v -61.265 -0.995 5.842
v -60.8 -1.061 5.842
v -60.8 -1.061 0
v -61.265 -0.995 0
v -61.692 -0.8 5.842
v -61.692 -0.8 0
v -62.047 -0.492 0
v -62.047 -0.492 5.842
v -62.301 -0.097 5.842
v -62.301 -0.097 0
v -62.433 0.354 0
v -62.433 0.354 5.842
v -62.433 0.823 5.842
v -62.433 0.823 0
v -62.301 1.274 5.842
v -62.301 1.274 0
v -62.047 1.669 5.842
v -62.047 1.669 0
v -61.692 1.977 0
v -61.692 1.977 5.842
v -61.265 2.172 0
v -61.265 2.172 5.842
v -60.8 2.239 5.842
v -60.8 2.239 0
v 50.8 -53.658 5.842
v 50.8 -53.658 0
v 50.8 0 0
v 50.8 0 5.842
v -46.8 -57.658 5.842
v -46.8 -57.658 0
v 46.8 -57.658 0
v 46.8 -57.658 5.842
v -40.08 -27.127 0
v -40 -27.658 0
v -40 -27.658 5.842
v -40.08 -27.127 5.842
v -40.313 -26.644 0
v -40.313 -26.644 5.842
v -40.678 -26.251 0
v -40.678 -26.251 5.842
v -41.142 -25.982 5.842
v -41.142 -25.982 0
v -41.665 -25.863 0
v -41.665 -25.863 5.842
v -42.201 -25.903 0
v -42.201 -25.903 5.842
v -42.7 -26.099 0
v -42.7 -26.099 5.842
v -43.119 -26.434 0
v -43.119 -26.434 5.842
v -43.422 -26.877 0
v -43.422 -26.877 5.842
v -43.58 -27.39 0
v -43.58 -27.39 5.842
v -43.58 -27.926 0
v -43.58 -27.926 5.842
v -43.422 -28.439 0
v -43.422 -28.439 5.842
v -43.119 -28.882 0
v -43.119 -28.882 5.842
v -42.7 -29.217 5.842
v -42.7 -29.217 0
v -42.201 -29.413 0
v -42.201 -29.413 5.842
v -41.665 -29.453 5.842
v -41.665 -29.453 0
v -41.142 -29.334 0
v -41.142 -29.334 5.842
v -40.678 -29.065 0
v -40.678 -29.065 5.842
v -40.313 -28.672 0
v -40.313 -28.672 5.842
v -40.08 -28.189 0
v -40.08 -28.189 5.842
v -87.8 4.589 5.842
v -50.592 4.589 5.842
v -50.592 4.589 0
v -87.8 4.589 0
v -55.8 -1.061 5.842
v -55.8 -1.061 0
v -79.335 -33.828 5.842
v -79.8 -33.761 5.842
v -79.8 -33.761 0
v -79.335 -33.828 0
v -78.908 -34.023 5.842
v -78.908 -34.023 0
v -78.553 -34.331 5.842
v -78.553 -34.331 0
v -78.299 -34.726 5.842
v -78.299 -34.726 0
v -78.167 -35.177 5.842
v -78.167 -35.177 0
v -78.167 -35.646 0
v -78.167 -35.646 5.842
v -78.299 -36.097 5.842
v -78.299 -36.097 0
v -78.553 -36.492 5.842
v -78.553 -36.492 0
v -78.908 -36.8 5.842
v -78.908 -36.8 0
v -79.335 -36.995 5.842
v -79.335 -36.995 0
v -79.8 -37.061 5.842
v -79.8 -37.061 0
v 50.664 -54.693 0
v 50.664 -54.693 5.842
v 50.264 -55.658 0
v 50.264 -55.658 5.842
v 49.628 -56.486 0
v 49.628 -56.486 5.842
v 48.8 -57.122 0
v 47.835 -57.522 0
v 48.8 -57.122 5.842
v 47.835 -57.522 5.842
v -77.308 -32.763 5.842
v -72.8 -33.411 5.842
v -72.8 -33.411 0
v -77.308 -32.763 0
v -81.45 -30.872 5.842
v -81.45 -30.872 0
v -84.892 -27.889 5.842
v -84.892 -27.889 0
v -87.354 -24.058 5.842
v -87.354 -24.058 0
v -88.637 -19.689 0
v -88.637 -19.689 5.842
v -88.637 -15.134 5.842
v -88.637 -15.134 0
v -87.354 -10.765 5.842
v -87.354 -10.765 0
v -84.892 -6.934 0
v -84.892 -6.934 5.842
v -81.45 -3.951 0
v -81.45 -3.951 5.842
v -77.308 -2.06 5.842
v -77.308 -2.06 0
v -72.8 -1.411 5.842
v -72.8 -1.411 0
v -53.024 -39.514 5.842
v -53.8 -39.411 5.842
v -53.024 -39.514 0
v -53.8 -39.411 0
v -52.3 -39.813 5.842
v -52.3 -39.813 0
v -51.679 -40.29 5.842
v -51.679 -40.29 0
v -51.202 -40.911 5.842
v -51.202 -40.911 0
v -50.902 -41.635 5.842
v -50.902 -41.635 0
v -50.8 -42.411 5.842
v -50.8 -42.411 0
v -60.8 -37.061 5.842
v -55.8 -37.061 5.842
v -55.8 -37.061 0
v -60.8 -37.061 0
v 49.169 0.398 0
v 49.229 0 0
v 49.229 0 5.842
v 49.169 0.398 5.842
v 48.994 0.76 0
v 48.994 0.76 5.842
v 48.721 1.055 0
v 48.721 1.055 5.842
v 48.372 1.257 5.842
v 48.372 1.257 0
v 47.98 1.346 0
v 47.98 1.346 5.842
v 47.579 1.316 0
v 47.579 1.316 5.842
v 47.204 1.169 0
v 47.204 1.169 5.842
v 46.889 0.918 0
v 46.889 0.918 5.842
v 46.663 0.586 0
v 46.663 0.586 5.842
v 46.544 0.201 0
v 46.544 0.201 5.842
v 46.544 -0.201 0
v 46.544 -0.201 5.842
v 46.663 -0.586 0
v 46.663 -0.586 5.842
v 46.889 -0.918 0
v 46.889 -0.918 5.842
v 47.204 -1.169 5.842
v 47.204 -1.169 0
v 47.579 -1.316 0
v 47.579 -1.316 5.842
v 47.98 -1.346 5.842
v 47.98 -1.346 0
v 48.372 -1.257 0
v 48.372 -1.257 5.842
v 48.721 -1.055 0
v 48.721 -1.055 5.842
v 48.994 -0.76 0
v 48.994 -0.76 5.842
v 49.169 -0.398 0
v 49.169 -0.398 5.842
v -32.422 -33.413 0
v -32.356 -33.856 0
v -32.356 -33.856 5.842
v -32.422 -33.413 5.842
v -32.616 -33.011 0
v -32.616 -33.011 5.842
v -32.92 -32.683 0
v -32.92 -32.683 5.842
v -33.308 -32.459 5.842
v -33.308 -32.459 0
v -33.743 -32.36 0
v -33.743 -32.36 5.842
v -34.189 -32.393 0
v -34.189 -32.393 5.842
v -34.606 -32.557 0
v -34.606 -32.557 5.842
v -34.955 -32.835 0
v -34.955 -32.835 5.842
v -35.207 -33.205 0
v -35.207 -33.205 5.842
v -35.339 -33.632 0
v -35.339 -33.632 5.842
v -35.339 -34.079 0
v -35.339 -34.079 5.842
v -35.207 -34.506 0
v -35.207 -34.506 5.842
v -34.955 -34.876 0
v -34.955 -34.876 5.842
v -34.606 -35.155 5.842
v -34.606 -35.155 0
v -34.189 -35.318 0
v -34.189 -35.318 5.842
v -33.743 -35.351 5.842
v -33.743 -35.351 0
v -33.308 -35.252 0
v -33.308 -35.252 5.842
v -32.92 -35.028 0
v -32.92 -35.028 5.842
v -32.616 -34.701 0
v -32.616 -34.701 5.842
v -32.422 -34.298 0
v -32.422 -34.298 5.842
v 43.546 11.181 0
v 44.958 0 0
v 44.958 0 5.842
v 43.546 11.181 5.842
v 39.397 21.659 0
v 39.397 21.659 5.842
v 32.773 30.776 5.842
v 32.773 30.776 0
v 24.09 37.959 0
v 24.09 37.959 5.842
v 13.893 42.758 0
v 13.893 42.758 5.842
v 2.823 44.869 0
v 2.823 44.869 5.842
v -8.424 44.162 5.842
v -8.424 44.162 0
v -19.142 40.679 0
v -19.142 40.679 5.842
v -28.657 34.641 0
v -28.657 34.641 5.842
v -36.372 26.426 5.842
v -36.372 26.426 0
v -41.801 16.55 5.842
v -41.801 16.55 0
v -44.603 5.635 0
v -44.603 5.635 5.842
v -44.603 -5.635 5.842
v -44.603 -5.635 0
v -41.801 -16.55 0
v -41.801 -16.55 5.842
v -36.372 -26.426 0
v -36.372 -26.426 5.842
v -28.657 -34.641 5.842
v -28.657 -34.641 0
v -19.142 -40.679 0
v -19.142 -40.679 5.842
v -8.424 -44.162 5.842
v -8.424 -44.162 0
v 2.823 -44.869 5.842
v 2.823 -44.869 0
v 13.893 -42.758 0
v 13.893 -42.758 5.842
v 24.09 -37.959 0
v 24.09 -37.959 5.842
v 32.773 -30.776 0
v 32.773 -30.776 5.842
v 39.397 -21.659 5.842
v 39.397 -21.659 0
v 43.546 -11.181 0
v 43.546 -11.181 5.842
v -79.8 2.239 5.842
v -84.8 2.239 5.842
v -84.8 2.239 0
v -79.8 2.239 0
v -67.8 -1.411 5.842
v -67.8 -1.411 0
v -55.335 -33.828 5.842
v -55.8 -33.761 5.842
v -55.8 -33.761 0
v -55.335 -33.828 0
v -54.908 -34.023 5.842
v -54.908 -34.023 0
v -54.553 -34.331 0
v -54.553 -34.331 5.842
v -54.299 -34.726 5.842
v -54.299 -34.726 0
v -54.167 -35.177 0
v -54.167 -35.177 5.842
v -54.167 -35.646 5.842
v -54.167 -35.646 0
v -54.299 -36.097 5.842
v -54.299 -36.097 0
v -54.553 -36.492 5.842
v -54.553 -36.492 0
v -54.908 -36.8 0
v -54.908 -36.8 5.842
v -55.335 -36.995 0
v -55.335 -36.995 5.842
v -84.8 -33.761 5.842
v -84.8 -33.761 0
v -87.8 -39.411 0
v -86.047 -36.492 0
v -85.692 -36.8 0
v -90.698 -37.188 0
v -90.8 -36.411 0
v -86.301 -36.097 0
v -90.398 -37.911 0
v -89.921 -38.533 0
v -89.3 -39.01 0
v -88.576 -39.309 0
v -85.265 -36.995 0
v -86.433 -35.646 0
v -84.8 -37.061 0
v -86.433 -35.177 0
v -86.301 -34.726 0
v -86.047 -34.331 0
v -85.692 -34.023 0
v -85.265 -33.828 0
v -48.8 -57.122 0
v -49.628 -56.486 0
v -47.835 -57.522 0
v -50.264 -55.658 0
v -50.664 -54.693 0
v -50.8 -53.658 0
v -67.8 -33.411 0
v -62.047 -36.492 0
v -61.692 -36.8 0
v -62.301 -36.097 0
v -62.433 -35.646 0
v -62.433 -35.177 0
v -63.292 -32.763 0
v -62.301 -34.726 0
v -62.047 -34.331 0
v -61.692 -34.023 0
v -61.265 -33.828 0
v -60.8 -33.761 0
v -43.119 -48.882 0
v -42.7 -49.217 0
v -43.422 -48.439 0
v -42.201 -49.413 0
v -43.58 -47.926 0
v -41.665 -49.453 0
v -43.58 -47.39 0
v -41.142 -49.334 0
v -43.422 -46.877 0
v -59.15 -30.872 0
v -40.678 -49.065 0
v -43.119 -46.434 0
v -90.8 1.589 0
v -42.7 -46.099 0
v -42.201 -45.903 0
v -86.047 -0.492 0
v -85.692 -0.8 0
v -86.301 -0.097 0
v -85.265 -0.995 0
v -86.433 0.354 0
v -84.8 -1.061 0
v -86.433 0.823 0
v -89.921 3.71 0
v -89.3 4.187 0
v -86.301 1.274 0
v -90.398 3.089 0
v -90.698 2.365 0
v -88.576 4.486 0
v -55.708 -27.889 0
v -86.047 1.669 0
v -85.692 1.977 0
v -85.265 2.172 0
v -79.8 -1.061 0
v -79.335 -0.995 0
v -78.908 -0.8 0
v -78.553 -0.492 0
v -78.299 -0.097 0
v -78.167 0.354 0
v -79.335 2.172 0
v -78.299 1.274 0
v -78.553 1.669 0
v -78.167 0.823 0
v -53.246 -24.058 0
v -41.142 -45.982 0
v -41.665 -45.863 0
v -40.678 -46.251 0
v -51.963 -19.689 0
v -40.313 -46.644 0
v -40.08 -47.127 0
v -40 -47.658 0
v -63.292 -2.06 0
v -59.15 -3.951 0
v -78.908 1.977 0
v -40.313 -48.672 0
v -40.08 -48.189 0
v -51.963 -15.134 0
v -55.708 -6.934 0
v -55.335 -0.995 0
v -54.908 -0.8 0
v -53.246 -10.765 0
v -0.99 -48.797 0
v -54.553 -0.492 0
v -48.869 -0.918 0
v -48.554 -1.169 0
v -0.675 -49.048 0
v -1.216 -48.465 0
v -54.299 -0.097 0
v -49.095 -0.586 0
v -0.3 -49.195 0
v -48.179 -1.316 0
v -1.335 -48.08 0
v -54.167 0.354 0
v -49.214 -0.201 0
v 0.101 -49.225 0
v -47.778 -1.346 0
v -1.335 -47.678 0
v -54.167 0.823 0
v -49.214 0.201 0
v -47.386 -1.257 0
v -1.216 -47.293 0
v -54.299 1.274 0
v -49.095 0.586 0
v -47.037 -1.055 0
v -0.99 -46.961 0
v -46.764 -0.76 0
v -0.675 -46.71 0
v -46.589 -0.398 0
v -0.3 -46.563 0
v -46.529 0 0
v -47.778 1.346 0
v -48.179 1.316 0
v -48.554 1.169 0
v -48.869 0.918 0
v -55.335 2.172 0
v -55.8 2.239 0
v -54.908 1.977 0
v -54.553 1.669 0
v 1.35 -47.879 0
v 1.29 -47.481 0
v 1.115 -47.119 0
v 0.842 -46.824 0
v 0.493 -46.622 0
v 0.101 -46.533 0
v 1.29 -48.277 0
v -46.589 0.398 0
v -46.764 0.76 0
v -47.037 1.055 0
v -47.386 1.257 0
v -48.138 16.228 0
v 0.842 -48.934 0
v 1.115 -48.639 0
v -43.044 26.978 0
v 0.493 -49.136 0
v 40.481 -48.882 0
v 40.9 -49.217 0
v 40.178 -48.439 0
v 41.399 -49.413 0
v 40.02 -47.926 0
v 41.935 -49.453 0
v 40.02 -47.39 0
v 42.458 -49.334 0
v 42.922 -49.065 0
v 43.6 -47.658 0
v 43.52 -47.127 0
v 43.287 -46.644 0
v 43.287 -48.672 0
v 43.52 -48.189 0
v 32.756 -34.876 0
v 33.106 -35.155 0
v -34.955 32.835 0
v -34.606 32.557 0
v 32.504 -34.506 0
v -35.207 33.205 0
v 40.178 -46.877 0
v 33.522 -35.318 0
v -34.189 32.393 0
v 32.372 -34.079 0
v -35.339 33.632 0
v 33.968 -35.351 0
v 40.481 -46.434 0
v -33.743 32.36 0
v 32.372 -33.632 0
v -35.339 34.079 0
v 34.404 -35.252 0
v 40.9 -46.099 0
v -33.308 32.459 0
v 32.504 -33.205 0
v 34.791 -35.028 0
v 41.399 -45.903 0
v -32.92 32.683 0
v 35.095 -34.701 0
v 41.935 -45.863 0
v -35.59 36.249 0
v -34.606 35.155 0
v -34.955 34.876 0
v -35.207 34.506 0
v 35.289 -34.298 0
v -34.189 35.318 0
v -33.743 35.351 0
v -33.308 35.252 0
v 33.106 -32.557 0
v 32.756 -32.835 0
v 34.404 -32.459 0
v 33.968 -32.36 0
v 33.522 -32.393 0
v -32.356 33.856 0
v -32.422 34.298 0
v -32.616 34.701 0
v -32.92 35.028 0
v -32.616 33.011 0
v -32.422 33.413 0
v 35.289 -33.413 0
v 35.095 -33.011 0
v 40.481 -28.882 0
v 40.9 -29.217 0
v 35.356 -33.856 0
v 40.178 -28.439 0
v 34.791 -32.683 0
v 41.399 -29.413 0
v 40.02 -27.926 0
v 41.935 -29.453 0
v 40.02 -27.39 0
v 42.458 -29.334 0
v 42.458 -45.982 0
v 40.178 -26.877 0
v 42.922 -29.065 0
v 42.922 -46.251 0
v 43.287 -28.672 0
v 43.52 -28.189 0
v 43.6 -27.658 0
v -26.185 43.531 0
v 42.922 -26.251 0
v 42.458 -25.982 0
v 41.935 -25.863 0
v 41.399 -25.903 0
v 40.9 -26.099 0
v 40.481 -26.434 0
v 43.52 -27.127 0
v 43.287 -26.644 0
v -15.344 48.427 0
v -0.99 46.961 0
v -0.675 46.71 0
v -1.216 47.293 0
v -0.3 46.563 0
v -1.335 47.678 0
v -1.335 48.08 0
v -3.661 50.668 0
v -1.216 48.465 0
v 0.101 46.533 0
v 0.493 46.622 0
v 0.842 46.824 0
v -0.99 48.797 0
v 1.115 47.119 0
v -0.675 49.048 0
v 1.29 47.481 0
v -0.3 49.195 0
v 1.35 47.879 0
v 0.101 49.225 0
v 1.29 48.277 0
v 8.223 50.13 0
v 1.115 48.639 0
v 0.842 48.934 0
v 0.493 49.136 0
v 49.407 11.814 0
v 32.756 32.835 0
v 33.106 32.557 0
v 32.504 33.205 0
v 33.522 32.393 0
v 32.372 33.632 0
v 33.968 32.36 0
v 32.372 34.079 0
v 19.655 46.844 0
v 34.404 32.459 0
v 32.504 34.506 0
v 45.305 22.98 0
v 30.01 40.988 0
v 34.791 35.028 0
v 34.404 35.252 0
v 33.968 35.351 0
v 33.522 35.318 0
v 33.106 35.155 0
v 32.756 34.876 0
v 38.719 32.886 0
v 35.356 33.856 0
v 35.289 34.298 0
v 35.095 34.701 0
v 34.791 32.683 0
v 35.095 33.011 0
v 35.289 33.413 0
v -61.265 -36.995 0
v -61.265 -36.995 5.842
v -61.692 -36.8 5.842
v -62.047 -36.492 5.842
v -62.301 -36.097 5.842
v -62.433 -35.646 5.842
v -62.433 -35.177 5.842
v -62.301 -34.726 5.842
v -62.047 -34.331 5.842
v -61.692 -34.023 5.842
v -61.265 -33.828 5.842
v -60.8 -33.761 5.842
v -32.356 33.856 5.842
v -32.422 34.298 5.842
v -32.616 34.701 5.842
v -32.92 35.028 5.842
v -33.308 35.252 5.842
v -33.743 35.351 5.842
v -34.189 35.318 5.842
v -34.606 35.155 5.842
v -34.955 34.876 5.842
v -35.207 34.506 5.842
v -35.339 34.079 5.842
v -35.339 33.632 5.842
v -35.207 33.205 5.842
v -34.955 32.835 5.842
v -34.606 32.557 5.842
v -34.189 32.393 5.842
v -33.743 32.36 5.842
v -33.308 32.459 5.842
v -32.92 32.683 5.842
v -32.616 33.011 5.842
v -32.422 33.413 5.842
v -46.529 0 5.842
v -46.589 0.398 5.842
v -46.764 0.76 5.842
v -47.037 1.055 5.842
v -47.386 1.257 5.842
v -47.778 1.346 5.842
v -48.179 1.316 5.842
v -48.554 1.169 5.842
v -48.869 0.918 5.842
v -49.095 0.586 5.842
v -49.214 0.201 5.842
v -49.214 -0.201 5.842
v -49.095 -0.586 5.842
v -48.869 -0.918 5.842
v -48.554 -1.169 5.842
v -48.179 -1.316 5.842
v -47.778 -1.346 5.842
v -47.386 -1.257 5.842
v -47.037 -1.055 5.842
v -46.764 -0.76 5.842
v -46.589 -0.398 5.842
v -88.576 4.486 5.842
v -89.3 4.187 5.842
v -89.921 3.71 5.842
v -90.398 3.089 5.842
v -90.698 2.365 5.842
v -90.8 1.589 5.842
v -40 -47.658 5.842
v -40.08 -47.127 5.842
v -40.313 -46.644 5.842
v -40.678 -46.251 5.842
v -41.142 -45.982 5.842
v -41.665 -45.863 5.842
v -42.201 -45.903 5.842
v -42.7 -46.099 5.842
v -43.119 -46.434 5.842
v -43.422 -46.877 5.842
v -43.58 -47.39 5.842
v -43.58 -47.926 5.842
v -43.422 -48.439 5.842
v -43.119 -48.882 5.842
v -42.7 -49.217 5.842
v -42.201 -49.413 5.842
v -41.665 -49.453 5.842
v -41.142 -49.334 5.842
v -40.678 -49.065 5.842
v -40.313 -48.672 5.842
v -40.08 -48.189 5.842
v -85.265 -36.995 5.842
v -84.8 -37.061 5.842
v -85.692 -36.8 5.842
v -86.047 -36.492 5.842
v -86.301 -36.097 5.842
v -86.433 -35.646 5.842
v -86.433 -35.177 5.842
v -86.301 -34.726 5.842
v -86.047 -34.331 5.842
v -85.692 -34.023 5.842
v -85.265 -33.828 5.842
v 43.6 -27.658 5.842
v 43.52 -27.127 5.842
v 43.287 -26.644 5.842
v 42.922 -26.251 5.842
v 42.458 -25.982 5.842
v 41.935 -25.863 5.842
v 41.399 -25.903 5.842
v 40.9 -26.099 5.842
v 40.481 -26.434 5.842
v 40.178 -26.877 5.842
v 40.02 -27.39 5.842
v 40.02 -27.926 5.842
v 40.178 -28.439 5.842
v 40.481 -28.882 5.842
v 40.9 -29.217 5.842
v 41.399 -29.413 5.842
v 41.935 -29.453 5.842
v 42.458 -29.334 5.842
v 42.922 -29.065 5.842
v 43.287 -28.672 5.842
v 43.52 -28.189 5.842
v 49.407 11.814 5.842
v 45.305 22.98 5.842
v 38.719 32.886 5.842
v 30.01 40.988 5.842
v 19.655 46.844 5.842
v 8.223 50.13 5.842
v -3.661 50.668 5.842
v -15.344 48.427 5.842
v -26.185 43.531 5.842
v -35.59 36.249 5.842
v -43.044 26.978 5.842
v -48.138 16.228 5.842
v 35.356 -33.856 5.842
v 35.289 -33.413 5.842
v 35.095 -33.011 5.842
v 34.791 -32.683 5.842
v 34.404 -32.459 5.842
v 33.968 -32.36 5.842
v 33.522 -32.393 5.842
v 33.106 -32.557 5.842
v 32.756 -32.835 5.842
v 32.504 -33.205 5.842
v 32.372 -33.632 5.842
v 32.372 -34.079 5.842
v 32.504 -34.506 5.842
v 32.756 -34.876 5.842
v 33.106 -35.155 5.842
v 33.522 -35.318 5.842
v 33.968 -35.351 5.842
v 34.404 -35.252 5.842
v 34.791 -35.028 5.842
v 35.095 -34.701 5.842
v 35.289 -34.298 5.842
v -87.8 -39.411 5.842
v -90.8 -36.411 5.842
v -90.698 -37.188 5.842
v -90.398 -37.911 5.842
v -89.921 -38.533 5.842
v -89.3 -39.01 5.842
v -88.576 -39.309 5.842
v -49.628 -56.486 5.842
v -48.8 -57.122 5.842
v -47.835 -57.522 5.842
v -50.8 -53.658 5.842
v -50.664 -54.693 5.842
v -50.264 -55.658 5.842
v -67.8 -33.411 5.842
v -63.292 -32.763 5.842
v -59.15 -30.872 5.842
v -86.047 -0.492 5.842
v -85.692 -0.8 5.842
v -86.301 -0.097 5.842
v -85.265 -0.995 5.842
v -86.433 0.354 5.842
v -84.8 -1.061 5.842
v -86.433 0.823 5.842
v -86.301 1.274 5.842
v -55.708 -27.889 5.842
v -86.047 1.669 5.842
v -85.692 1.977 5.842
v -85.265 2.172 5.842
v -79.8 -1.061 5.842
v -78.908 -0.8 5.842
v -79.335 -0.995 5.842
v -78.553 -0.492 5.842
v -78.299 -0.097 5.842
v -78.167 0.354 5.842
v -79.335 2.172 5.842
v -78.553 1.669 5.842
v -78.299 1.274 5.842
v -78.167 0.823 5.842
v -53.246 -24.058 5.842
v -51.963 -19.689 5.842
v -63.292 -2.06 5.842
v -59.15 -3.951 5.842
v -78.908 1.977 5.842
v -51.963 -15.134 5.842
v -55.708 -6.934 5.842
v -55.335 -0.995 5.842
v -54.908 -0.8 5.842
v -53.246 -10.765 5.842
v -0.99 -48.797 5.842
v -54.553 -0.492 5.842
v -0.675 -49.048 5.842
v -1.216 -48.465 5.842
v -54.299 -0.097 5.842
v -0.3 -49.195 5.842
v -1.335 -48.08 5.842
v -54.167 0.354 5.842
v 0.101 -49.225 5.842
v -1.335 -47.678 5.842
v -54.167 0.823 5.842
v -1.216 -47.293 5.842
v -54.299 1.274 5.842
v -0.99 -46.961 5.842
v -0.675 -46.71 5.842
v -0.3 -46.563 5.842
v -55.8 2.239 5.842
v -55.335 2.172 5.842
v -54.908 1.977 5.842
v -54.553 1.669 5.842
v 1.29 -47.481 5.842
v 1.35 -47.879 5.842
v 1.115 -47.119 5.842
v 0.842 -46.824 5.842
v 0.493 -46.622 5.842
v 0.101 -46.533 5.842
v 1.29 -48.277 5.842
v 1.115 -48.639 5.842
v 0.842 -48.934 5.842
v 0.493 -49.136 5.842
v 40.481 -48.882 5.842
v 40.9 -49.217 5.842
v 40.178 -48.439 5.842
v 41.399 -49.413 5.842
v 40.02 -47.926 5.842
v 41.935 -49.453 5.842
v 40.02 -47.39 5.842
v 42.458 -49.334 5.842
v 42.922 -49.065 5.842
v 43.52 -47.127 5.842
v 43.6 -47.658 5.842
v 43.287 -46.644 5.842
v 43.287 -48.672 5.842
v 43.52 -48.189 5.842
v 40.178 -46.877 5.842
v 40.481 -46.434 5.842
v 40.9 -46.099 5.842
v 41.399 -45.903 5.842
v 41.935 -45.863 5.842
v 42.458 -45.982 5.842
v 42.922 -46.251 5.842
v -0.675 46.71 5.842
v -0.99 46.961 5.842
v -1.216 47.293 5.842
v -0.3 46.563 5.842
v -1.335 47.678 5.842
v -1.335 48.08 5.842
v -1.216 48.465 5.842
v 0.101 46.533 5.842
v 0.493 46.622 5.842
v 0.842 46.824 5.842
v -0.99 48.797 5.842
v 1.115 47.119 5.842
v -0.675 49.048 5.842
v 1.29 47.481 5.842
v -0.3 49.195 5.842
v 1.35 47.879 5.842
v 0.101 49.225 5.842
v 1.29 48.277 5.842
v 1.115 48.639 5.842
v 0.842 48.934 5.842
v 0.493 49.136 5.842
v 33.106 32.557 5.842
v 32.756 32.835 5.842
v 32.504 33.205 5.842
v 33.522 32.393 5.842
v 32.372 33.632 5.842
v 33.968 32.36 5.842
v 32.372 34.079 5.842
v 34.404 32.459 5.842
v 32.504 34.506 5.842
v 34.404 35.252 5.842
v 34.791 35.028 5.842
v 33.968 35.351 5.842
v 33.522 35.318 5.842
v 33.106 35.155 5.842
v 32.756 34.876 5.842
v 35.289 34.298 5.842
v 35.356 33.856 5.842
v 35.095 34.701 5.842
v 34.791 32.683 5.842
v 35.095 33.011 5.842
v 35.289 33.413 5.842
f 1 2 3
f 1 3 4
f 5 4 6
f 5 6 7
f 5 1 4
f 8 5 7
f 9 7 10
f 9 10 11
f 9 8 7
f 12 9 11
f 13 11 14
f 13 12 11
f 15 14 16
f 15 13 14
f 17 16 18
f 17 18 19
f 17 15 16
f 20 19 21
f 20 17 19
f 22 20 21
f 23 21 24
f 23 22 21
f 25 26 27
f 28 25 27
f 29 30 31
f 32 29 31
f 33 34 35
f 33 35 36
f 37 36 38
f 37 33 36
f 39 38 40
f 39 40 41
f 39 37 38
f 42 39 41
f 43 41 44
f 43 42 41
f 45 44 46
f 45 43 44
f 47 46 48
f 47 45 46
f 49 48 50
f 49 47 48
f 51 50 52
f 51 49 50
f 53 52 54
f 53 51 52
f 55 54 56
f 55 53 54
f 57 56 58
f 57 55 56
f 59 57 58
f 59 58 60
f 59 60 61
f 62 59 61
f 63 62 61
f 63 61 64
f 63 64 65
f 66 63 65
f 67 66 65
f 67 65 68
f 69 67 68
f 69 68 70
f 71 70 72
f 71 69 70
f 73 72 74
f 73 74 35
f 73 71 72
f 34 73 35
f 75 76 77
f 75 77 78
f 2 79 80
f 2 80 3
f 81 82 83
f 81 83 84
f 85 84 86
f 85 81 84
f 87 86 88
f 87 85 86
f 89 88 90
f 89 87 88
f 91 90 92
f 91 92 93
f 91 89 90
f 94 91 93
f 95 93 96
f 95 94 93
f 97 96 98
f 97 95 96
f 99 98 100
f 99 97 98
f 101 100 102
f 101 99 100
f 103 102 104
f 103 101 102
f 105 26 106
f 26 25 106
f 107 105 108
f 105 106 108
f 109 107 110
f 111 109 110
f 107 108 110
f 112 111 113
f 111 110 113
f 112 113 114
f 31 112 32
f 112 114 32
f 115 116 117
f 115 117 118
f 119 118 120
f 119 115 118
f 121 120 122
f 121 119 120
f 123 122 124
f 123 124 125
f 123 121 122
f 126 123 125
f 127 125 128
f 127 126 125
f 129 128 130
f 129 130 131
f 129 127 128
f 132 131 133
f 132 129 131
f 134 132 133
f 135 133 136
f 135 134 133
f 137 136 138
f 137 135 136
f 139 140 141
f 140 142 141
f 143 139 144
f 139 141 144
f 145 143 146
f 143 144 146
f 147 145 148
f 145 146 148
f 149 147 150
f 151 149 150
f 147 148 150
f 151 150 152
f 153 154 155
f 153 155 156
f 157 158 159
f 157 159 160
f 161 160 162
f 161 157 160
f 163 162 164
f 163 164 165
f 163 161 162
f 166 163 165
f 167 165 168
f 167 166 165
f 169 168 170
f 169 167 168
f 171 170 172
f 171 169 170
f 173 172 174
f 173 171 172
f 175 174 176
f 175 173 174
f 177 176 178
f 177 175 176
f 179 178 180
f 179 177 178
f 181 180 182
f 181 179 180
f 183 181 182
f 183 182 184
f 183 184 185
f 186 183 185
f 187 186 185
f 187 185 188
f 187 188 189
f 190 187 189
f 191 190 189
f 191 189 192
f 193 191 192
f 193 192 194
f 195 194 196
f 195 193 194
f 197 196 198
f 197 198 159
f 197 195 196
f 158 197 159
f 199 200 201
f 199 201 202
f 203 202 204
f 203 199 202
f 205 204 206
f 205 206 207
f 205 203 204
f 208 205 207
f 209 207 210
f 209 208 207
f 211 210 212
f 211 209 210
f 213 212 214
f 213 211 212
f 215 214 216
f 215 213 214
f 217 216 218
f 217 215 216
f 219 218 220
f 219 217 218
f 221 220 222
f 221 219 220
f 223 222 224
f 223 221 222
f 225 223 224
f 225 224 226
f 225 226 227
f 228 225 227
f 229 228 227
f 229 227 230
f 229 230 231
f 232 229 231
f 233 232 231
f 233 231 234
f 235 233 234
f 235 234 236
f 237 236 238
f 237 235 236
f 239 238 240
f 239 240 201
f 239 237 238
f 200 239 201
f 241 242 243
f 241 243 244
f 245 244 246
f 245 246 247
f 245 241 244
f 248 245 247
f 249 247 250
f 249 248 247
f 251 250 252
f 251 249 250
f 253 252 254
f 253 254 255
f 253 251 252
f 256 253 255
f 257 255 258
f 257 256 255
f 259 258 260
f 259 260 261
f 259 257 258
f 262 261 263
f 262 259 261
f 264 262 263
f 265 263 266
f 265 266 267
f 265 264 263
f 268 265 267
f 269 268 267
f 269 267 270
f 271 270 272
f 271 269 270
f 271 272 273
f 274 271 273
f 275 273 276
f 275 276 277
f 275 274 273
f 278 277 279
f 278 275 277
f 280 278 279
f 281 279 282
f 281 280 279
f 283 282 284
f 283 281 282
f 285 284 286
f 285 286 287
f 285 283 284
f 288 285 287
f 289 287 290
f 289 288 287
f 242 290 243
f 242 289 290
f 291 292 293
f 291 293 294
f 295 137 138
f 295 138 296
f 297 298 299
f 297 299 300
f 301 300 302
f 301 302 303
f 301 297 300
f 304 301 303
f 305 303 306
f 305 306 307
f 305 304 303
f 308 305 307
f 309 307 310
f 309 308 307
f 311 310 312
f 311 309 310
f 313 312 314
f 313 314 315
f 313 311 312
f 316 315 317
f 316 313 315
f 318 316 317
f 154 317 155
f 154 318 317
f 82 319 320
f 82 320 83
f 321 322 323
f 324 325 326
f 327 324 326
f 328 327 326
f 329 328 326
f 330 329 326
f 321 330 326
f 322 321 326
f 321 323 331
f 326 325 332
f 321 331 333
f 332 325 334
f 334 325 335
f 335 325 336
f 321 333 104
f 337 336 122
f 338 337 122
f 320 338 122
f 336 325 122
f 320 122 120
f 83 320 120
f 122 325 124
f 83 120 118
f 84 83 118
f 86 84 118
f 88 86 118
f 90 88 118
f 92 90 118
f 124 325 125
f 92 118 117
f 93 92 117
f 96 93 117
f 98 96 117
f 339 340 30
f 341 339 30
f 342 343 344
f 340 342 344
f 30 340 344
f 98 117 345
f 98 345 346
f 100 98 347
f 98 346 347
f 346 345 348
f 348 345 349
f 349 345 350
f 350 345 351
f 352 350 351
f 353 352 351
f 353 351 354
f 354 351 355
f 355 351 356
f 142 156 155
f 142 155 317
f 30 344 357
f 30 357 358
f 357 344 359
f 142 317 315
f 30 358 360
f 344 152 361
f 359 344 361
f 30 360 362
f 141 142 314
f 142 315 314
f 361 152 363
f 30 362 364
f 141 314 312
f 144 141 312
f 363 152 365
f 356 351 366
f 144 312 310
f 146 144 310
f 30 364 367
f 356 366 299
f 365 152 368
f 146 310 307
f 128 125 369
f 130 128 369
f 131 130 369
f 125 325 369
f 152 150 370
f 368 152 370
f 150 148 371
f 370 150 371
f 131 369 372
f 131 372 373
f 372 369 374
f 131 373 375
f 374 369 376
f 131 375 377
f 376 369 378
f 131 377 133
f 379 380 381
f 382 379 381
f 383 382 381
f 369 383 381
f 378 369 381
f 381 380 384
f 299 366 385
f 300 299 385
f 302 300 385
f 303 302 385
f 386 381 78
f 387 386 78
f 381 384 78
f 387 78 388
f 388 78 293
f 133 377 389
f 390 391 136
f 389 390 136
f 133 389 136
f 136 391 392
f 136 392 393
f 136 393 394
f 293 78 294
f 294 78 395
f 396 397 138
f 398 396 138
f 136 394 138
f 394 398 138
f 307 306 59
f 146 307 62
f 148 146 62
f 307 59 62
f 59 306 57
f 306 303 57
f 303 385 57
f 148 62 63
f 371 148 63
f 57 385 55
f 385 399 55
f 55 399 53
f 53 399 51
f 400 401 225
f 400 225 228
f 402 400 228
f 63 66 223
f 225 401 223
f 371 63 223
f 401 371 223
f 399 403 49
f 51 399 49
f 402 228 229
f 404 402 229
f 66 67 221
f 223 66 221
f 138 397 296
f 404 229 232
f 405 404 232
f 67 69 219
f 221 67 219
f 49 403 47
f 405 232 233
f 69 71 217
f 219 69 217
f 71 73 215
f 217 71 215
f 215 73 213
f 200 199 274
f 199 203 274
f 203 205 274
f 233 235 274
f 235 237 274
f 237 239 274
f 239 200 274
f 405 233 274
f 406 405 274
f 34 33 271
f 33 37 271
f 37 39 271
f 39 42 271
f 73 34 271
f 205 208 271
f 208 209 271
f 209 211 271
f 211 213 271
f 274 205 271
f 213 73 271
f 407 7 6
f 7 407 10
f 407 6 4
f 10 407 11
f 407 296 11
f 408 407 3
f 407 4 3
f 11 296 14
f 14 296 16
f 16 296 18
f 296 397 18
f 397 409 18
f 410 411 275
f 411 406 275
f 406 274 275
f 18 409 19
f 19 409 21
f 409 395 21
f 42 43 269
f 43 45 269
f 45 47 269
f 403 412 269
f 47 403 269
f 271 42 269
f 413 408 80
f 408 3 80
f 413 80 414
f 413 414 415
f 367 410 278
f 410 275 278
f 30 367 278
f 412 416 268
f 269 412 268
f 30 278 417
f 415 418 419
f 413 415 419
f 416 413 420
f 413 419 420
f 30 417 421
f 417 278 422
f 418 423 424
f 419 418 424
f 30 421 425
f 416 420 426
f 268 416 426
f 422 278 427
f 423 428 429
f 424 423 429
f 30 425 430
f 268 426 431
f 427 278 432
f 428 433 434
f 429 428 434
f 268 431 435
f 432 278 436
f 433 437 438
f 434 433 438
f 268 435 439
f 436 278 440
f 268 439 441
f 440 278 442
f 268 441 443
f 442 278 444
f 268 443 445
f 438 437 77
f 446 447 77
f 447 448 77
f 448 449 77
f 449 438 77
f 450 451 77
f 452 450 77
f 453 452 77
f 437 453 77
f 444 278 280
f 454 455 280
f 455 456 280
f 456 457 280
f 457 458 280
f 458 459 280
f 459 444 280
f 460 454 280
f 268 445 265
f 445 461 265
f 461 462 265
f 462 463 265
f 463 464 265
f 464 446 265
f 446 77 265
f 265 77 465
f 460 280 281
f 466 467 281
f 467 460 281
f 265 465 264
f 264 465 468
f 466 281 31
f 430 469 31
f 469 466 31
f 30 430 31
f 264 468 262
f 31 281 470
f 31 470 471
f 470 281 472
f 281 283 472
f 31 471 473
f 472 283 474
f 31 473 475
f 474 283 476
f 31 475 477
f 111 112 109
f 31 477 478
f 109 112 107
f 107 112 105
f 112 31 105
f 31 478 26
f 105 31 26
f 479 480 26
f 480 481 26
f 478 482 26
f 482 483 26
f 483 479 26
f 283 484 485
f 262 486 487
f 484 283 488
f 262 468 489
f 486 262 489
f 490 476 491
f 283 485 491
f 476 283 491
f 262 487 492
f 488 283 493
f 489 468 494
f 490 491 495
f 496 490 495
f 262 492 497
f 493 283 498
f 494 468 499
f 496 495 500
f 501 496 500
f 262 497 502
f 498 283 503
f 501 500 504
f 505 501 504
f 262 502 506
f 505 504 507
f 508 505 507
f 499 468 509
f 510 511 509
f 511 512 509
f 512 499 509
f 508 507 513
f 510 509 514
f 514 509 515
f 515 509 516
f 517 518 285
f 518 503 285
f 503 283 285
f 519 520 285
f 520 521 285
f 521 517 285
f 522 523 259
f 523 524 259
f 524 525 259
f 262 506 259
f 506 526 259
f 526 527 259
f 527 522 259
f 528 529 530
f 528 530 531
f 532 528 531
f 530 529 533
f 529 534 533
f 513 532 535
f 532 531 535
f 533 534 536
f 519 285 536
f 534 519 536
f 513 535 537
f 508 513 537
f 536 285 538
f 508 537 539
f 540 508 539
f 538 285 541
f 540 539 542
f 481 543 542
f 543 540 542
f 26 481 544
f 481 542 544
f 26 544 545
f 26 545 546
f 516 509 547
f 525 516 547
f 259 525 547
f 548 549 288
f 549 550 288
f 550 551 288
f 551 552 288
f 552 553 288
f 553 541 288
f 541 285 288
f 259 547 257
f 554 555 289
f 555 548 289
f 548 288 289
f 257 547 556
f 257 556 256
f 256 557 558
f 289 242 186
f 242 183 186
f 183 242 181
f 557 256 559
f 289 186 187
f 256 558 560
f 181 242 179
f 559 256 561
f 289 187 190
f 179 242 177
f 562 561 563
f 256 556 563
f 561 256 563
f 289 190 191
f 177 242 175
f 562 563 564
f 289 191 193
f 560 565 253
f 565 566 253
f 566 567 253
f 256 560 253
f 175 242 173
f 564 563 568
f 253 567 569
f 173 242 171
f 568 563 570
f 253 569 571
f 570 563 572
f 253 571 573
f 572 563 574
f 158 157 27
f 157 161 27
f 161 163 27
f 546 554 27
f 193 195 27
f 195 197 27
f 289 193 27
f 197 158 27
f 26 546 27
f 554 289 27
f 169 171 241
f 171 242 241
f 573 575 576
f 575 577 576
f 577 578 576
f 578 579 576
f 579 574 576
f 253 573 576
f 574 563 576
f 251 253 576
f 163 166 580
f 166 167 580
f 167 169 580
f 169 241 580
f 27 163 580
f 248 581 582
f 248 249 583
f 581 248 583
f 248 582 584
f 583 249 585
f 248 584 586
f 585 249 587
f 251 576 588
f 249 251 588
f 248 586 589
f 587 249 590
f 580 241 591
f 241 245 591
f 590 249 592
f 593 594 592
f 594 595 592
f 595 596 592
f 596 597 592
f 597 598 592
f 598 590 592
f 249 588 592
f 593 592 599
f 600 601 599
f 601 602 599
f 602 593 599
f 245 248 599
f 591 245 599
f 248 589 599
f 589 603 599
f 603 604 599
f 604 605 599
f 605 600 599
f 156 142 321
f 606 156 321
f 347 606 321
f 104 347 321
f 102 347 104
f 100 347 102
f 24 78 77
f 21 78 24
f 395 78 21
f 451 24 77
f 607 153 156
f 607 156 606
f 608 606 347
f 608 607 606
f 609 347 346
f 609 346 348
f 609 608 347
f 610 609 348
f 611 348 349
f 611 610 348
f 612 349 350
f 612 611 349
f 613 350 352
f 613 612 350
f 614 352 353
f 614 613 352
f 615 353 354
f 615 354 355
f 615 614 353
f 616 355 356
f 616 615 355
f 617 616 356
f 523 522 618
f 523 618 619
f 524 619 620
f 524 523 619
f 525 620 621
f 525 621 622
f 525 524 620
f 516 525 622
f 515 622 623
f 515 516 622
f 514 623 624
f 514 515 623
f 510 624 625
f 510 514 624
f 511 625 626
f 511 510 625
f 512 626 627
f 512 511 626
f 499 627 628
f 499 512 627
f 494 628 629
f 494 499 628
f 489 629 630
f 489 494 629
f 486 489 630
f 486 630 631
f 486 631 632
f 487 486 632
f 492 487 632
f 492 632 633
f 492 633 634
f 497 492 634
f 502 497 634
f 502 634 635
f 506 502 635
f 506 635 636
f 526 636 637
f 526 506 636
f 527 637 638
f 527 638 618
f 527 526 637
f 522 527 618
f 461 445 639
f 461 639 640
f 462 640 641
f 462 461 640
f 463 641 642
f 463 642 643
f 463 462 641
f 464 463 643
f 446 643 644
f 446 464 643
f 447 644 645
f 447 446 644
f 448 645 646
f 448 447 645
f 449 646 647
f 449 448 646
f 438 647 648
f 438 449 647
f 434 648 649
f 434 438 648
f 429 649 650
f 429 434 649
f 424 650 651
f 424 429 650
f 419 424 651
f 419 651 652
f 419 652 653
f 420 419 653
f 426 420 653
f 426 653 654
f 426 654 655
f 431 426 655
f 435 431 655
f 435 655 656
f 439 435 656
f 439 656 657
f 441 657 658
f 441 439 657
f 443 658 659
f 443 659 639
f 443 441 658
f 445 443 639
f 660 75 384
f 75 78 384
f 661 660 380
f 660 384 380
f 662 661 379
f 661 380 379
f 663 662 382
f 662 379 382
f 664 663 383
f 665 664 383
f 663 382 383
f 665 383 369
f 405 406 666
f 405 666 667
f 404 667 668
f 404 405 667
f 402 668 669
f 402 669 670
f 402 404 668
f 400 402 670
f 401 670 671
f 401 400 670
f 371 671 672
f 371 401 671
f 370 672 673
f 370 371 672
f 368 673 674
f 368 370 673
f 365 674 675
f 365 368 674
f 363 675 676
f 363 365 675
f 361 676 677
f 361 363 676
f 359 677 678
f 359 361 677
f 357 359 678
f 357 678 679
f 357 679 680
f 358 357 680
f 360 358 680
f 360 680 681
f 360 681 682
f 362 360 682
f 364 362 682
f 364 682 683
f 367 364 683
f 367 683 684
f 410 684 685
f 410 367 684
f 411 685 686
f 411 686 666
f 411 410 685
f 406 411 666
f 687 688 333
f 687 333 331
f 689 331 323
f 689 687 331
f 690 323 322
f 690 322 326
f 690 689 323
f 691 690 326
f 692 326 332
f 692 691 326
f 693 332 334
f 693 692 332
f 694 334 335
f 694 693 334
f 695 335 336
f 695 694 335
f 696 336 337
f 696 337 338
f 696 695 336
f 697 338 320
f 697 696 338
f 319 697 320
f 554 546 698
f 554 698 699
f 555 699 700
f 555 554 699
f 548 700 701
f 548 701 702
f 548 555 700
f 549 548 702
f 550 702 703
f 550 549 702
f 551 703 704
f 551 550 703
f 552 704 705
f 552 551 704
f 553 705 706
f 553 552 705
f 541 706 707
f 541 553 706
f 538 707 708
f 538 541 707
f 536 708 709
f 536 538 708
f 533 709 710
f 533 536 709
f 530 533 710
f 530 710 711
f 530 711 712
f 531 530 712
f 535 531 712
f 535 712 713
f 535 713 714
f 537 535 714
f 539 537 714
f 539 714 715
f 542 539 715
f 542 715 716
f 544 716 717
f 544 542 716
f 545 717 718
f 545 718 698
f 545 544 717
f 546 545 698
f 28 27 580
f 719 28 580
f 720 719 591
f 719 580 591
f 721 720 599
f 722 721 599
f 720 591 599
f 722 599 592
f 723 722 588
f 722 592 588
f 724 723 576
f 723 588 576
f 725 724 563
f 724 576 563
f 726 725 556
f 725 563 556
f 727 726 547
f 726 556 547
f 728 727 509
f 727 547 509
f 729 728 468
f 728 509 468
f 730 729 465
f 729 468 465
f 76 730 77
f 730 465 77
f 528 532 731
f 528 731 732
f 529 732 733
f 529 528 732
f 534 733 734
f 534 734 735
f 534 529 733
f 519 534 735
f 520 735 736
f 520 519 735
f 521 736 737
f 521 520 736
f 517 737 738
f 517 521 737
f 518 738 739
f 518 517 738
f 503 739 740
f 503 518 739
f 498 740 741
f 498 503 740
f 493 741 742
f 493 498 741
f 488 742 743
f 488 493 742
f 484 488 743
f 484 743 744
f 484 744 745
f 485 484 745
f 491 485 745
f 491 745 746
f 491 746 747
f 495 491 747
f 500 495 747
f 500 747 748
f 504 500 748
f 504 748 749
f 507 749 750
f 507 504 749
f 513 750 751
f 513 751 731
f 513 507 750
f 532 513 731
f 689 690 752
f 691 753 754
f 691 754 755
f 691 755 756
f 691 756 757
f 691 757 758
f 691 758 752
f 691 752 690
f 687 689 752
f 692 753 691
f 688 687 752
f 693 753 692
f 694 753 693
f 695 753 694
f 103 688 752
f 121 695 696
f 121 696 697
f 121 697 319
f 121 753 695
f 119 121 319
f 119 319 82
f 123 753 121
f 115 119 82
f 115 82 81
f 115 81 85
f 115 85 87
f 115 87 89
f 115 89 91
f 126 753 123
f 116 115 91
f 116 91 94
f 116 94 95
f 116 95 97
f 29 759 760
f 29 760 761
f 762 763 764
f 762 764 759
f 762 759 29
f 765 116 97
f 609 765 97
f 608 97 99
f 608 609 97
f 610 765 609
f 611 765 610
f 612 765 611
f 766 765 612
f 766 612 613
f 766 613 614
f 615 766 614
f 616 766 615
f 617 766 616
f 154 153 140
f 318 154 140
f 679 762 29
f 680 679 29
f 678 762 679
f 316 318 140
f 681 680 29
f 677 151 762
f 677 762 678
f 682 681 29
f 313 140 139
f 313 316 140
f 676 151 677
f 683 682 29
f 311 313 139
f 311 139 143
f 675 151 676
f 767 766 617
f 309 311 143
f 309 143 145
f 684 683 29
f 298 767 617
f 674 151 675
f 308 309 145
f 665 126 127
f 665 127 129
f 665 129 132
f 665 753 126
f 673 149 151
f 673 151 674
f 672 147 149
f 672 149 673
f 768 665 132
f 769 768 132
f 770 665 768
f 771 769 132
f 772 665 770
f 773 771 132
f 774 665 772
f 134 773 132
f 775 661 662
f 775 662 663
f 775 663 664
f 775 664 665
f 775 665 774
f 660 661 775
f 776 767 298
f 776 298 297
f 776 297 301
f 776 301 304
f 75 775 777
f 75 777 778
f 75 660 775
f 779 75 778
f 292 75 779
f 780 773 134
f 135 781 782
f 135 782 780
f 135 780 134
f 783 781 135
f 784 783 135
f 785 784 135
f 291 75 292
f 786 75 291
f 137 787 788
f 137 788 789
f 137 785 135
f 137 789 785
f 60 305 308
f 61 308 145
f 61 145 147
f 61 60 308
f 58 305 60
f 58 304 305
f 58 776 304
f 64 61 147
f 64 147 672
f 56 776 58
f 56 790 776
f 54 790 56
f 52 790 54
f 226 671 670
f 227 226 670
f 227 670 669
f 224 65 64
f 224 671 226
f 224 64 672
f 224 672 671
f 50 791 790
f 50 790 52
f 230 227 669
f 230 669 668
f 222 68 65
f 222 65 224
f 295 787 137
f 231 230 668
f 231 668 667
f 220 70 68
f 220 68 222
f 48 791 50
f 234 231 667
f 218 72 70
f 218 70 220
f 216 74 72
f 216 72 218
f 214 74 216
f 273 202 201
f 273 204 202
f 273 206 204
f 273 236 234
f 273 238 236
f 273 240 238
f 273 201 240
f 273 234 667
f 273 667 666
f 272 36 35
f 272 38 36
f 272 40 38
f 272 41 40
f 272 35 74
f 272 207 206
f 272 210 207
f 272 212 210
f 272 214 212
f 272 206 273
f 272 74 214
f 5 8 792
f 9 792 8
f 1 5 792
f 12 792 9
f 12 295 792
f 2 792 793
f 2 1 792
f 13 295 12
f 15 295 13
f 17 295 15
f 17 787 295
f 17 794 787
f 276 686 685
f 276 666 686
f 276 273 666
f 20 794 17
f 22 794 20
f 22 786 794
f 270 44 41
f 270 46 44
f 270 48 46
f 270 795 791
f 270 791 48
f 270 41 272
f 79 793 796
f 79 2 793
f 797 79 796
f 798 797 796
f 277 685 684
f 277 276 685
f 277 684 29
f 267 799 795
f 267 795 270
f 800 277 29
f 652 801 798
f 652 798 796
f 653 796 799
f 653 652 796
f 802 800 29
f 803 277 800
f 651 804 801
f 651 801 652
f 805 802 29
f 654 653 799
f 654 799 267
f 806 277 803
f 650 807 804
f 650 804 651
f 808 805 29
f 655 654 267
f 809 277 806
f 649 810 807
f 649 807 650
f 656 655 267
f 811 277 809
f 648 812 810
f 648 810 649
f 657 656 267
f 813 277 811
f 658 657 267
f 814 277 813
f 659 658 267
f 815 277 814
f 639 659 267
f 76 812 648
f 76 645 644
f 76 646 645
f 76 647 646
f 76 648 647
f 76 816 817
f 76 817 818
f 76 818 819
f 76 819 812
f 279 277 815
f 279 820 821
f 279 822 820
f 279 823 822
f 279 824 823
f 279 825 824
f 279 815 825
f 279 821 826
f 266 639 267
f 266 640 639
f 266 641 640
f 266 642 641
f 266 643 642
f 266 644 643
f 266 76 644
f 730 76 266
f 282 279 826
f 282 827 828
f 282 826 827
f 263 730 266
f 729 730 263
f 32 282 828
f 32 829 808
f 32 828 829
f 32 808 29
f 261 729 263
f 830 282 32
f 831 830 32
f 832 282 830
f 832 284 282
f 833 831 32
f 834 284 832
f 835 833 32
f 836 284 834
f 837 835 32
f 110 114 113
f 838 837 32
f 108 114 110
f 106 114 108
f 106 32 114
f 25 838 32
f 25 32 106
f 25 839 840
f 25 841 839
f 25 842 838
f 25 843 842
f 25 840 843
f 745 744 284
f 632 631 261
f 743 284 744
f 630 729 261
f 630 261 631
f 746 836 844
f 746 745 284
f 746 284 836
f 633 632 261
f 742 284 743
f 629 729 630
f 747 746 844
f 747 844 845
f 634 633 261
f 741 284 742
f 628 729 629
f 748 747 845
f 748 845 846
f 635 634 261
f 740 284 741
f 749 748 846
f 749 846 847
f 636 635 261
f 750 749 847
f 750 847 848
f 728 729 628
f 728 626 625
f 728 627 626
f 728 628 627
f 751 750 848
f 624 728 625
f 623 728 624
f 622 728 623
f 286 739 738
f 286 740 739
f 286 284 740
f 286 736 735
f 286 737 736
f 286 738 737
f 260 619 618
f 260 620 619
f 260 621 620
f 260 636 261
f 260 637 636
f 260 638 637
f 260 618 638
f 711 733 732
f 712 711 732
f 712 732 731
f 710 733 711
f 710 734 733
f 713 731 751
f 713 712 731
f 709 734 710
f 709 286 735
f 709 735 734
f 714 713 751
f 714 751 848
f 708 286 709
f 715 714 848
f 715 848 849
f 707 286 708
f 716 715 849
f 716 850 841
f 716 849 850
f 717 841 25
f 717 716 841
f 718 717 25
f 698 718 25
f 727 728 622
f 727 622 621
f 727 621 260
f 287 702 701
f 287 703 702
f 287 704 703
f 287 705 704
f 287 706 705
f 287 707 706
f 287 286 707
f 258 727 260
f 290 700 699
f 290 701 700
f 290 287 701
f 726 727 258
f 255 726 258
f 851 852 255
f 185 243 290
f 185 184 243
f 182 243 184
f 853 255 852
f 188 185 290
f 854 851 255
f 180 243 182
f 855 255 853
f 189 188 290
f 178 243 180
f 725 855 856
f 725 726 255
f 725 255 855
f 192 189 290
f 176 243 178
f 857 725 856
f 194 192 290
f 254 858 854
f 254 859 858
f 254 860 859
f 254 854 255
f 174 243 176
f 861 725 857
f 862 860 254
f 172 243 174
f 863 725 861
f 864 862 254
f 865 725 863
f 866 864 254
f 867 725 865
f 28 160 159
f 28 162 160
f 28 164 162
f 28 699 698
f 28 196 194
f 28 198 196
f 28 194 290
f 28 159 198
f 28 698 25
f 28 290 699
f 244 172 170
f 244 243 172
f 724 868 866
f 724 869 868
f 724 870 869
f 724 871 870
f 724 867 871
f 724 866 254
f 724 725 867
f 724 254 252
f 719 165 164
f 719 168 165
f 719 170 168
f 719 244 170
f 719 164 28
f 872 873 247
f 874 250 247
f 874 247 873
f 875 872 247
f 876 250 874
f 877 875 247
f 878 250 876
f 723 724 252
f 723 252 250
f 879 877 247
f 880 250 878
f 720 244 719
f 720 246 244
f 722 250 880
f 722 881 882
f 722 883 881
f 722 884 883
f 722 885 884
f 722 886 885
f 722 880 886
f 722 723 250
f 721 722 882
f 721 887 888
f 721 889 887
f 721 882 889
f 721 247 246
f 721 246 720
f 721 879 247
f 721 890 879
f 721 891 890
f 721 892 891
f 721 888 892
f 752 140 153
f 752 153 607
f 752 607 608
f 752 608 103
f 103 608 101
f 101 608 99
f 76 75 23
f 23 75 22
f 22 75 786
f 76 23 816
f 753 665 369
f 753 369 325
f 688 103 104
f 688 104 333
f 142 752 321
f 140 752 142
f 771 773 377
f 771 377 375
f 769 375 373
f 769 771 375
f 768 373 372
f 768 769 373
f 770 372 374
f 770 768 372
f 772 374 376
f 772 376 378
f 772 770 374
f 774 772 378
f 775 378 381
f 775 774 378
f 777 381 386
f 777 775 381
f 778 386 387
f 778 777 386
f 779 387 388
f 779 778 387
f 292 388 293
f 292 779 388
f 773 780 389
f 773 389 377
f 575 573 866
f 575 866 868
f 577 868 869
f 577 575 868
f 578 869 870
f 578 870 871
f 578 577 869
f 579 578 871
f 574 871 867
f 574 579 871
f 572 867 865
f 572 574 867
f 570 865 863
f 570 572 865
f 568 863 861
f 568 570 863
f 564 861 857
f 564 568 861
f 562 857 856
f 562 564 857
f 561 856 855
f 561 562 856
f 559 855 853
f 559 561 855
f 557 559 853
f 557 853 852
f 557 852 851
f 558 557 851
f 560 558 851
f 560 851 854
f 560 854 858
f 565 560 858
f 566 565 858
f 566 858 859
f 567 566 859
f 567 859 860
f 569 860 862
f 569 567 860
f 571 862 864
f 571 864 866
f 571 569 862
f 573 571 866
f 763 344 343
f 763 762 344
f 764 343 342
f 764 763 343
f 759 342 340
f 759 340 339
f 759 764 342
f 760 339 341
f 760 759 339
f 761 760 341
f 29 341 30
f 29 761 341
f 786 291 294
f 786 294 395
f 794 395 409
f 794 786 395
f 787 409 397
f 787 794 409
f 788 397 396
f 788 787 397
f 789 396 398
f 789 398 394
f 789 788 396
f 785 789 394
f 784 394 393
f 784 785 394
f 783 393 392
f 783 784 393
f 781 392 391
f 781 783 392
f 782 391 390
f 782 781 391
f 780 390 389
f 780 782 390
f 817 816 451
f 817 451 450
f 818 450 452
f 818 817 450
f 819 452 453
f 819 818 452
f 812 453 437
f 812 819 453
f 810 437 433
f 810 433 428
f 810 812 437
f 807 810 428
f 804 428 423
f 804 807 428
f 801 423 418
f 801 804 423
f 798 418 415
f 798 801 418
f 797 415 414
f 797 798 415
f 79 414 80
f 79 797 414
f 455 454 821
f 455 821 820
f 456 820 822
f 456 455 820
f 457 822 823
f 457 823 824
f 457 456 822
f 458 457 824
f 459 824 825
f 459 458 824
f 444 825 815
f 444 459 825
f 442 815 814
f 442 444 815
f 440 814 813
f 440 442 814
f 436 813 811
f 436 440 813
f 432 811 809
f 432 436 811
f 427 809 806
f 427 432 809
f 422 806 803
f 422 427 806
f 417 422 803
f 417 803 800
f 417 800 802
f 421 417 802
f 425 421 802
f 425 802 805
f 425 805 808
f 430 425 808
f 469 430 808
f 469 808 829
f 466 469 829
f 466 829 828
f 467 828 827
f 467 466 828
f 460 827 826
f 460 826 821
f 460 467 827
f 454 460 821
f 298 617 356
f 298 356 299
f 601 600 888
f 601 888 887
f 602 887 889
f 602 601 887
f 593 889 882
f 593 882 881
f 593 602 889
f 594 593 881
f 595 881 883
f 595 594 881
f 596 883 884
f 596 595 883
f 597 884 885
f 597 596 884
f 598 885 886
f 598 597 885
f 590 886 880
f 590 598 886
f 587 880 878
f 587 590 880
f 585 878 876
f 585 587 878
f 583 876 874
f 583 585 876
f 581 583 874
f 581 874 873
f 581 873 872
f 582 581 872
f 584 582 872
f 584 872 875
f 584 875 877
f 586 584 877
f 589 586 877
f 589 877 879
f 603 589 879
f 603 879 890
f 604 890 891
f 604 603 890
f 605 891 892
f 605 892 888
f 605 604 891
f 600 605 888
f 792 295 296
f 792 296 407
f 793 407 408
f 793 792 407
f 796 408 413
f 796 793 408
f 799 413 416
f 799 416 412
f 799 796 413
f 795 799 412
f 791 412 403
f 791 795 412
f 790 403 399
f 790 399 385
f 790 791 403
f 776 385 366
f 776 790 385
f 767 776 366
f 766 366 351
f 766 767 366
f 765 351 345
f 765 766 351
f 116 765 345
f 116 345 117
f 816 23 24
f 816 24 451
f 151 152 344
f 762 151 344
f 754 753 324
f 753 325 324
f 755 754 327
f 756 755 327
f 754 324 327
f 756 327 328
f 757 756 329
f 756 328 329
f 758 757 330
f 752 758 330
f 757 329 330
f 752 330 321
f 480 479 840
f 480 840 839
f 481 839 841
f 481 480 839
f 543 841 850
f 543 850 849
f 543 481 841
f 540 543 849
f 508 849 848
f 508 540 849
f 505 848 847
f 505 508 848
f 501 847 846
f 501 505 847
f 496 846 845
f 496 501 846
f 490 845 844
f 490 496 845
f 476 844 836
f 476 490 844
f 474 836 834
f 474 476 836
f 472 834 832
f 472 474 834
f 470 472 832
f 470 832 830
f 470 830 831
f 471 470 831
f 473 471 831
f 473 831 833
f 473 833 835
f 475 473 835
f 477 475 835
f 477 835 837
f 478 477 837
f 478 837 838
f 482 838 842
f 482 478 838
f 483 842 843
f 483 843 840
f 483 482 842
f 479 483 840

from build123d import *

# Parameters (mm, degrees)
SKETCH1_R           = 1.8
SKETCH1_R_2         = 1.5
SKETCH1_R_3         = 1.35
SKETCH1_R_4         = 44.958
BOSS_EXTRUDE1_DEPTH = 5.842
FILLET1_R           = 4
BOSS_EXTRUDE2_DEPTH = 5.842
FILLET2_R           = 3


with BuildPart() as part:
    # Sketch1 → Boss-Extrude1 (new body)
    # profile 1 of 2: a face of its own
    with BuildSketch(Plane.XY):
        with BuildLine():
            ThreePointArc((50.8, 0), (0, 50.8), (-50.8, 0))
            Line((-50.8, 0), (-50.8, -57.658))
            Line((-50.8, -57.658), (0, -57.658))
            Line((0, -57.658), (50.8, -57.658))
            Line((50.8, -57.658), (50.8, 0))
        make_face()
        with Locations((-41.8, -47.658)):
            Circle(SKETCH1_R, mode=Mode.SUBTRACT)
        with Locations((-33.855565576, -33.855565576)):
            Circle(SKETCH1_R_2, mode=Mode.SUBTRACT)
        with Locations((-41.8, -27.658)):
            Circle(SKETCH1_R, mode=Mode.SUBTRACT)
        with Locations((0, -47.879)):
            Circle(SKETCH1_R_3, mode=Mode.SUBTRACT)
        with Locations((41.8, -47.658)):
            Circle(SKETCH1_R, mode=Mode.SUBTRACT)
        with Locations((33.855565576, -33.855565576)):
            Circle(SKETCH1_R_2, mode=Mode.SUBTRACT)
        with Locations((41.8, -27.658)):
            Circle(SKETCH1_R, mode=Mode.SUBTRACT)
        with Locations((-47.879, 0)):
            Circle(SKETCH1_R_3, mode=Mode.SUBTRACT)
        Circle(SKETCH1_R_4, mode=Mode.SUBTRACT)
        with Locations((-33.855565576, 33.855565576)):
            Circle(SKETCH1_R_2, mode=Mode.SUBTRACT)
        with Locations((0, 47.879)):
            Circle(SKETCH1_R_3, mode=Mode.SUBTRACT)
        with Locations((47.879, 0)):
            Circle(SKETCH1_R_3, mode=Mode.SUBTRACT)
        with Locations((33.855565576, 33.855565576)):
            Circle(SKETCH1_R_2, mode=Mode.SUBTRACT)
    # profile 2 of 2: a face of its own
    with BuildSketch(Plane.XY):
        with BuildLine():
            ThreePointArc((50.8, 0), (0, 50.8), (-50.8, 0))
            Line((-50.8, 0), (-50.8, -57.658))
            Line((-50.8, -57.658), (0, -57.658))
            Line((0, -57.658), (50.8, -57.658))
            Line((50.8, -57.658), (50.8, 0))
        make_face()
        with Locations((-41.8, -47.658)):
            Circle(SKETCH1_R, mode=Mode.SUBTRACT)
        with Locations((-33.855565576, -33.855565576)):
            Circle(SKETCH1_R_2, mode=Mode.SUBTRACT)
        with Locations((-41.8, -27.658)):
            Circle(SKETCH1_R, mode=Mode.SUBTRACT)
        with Locations((0, -47.879)):
            Circle(SKETCH1_R_3, mode=Mode.SUBTRACT)
        with Locations((41.8, -47.658)):
            Circle(SKETCH1_R, mode=Mode.SUBTRACT)
        with Locations((33.855565576, -33.855565576)):
            Circle(SKETCH1_R_2, mode=Mode.SUBTRACT)
        with Locations((41.8, -27.658)):
            Circle(SKETCH1_R, mode=Mode.SUBTRACT)
        with Locations((-47.879, 0)):
            Circle(SKETCH1_R_3, mode=Mode.SUBTRACT)
        Circle(SKETCH1_R_4, mode=Mode.SUBTRACT)
        with Locations((-33.855565576, 33.855565576)):
            Circle(SKETCH1_R_2, mode=Mode.SUBTRACT)
        with Locations((0, 47.879)):
            Circle(SKETCH1_R_3, mode=Mode.SUBTRACT)
        with Locations((47.879, 0)):
            Circle(SKETCH1_R_3, mode=Mode.SUBTRACT)
        with Locations((33.855565576, 33.855565576)):
            Circle(SKETCH1_R_2, mode=Mode.SUBTRACT)
    extrude(amount=BOSS_EXTRUDE1_DEPTH)

    # Fillet1
    fillet1_edges = [part.edges().sort_by_distance(p)[0] for p in [
        (50.8, -57.658, 2.921),
        (-50.8, -57.658, 2.921),
    ]]
    fillet(fillet1_edges, radius=FILLET1_R)

    # Sketch2 → Boss-Extrude2 (add, through all)
    with BuildSketch(Plane.XY.offset(5.842)):
        Polygon((-50.592347052, 4.588509541), (-90.8, 4.588509541), (-90.8, -39.411490459), (-50.8, -39.411490459), align=None)
        with BuildLine():
            Line((-67.8, -33.411490459), (-72.8, -33.411490459))
            ThreePointArc((-72.8, -33.411490459), (-88.8, -17.411490459), (-72.8, -1.411490459))
            Line((-72.8, -1.411490459), (-67.8, -1.411490459))
            ThreePointArc((-67.8, -1.411490459), (-51.8, -17.411490459), (-67.8, -33.411490459))
        make_face(mode=Mode.SUBTRACT)
        with BuildLine():
            Line((-79.8, -1.061490459), (-84.8, -1.061490459))
            ThreePointArc((-84.8, -1.061490459), (-86.45, 0.588509541), (-84.8, 2.238509541))
            Line((-84.8, 2.238509541), (-79.8, 2.238509541))
            ThreePointArc((-79.8, 2.238509541), (-78.15, 0.588509541), (-79.8, -1.061490459))
        make_face(mode=Mode.SUBTRACT)
        with BuildLine():
            Line((-55.8, -1.061490459), (-60.8, -1.061490459))
            ThreePointArc((-60.8, -1.061490459), (-62.45, 0.588509541), (-60.8, 2.238509541))
            Line((-60.8, 2.238509541), (-55.8, 2.238509541))
            ThreePointArc((-55.8, 2.238509541), (-54.15, 0.588509541), (-55.8, -1.061490459))
        make_face(mode=Mode.SUBTRACT)
        with BuildLine():
            Line((-79.8, -37.061490459), (-84.8, -37.061490459))
            ThreePointArc((-84.8, -37.061490459), (-86.45, -35.411490459), (-84.8, -33.761490459))
            Line((-84.8, -33.761490459), (-79.8, -33.761490459))
            ThreePointArc((-79.8, -33.761490459), (-78.15, -35.411490459), (-79.8, -37.061490459))
        make_face(mode=Mode.SUBTRACT)
        with BuildLine():
            Line((-55.8, -37.061490459), (-60.8, -37.061490459))
            ThreePointArc((-60.8, -37.061490459), (-62.45, -35.411490459), (-60.8, -33.761490459))
            Line((-60.8, -33.761490459), (-55.8, -33.761490459))
            ThreePointArc((-55.8, -33.761490459), (-54.15, -35.411490459), (-55.8, -37.061490459))
        make_face(mode=Mode.SUBTRACT)
    extrude(amount=-BOSS_EXTRUDE2_DEPTH)

    # Fillet2
    fillet2_edges = [part.edges().sort_by_distance(p)[0] for p in [
        (-50.8, -39.411490459, 2.921),
        (-90.8, -39.411490459, 2.921),
        (-90.8, 4.588509541, 2.921),
    ]]
    fillet(fillet2_edges, radius=FILLET2_R)


solid = part.part
